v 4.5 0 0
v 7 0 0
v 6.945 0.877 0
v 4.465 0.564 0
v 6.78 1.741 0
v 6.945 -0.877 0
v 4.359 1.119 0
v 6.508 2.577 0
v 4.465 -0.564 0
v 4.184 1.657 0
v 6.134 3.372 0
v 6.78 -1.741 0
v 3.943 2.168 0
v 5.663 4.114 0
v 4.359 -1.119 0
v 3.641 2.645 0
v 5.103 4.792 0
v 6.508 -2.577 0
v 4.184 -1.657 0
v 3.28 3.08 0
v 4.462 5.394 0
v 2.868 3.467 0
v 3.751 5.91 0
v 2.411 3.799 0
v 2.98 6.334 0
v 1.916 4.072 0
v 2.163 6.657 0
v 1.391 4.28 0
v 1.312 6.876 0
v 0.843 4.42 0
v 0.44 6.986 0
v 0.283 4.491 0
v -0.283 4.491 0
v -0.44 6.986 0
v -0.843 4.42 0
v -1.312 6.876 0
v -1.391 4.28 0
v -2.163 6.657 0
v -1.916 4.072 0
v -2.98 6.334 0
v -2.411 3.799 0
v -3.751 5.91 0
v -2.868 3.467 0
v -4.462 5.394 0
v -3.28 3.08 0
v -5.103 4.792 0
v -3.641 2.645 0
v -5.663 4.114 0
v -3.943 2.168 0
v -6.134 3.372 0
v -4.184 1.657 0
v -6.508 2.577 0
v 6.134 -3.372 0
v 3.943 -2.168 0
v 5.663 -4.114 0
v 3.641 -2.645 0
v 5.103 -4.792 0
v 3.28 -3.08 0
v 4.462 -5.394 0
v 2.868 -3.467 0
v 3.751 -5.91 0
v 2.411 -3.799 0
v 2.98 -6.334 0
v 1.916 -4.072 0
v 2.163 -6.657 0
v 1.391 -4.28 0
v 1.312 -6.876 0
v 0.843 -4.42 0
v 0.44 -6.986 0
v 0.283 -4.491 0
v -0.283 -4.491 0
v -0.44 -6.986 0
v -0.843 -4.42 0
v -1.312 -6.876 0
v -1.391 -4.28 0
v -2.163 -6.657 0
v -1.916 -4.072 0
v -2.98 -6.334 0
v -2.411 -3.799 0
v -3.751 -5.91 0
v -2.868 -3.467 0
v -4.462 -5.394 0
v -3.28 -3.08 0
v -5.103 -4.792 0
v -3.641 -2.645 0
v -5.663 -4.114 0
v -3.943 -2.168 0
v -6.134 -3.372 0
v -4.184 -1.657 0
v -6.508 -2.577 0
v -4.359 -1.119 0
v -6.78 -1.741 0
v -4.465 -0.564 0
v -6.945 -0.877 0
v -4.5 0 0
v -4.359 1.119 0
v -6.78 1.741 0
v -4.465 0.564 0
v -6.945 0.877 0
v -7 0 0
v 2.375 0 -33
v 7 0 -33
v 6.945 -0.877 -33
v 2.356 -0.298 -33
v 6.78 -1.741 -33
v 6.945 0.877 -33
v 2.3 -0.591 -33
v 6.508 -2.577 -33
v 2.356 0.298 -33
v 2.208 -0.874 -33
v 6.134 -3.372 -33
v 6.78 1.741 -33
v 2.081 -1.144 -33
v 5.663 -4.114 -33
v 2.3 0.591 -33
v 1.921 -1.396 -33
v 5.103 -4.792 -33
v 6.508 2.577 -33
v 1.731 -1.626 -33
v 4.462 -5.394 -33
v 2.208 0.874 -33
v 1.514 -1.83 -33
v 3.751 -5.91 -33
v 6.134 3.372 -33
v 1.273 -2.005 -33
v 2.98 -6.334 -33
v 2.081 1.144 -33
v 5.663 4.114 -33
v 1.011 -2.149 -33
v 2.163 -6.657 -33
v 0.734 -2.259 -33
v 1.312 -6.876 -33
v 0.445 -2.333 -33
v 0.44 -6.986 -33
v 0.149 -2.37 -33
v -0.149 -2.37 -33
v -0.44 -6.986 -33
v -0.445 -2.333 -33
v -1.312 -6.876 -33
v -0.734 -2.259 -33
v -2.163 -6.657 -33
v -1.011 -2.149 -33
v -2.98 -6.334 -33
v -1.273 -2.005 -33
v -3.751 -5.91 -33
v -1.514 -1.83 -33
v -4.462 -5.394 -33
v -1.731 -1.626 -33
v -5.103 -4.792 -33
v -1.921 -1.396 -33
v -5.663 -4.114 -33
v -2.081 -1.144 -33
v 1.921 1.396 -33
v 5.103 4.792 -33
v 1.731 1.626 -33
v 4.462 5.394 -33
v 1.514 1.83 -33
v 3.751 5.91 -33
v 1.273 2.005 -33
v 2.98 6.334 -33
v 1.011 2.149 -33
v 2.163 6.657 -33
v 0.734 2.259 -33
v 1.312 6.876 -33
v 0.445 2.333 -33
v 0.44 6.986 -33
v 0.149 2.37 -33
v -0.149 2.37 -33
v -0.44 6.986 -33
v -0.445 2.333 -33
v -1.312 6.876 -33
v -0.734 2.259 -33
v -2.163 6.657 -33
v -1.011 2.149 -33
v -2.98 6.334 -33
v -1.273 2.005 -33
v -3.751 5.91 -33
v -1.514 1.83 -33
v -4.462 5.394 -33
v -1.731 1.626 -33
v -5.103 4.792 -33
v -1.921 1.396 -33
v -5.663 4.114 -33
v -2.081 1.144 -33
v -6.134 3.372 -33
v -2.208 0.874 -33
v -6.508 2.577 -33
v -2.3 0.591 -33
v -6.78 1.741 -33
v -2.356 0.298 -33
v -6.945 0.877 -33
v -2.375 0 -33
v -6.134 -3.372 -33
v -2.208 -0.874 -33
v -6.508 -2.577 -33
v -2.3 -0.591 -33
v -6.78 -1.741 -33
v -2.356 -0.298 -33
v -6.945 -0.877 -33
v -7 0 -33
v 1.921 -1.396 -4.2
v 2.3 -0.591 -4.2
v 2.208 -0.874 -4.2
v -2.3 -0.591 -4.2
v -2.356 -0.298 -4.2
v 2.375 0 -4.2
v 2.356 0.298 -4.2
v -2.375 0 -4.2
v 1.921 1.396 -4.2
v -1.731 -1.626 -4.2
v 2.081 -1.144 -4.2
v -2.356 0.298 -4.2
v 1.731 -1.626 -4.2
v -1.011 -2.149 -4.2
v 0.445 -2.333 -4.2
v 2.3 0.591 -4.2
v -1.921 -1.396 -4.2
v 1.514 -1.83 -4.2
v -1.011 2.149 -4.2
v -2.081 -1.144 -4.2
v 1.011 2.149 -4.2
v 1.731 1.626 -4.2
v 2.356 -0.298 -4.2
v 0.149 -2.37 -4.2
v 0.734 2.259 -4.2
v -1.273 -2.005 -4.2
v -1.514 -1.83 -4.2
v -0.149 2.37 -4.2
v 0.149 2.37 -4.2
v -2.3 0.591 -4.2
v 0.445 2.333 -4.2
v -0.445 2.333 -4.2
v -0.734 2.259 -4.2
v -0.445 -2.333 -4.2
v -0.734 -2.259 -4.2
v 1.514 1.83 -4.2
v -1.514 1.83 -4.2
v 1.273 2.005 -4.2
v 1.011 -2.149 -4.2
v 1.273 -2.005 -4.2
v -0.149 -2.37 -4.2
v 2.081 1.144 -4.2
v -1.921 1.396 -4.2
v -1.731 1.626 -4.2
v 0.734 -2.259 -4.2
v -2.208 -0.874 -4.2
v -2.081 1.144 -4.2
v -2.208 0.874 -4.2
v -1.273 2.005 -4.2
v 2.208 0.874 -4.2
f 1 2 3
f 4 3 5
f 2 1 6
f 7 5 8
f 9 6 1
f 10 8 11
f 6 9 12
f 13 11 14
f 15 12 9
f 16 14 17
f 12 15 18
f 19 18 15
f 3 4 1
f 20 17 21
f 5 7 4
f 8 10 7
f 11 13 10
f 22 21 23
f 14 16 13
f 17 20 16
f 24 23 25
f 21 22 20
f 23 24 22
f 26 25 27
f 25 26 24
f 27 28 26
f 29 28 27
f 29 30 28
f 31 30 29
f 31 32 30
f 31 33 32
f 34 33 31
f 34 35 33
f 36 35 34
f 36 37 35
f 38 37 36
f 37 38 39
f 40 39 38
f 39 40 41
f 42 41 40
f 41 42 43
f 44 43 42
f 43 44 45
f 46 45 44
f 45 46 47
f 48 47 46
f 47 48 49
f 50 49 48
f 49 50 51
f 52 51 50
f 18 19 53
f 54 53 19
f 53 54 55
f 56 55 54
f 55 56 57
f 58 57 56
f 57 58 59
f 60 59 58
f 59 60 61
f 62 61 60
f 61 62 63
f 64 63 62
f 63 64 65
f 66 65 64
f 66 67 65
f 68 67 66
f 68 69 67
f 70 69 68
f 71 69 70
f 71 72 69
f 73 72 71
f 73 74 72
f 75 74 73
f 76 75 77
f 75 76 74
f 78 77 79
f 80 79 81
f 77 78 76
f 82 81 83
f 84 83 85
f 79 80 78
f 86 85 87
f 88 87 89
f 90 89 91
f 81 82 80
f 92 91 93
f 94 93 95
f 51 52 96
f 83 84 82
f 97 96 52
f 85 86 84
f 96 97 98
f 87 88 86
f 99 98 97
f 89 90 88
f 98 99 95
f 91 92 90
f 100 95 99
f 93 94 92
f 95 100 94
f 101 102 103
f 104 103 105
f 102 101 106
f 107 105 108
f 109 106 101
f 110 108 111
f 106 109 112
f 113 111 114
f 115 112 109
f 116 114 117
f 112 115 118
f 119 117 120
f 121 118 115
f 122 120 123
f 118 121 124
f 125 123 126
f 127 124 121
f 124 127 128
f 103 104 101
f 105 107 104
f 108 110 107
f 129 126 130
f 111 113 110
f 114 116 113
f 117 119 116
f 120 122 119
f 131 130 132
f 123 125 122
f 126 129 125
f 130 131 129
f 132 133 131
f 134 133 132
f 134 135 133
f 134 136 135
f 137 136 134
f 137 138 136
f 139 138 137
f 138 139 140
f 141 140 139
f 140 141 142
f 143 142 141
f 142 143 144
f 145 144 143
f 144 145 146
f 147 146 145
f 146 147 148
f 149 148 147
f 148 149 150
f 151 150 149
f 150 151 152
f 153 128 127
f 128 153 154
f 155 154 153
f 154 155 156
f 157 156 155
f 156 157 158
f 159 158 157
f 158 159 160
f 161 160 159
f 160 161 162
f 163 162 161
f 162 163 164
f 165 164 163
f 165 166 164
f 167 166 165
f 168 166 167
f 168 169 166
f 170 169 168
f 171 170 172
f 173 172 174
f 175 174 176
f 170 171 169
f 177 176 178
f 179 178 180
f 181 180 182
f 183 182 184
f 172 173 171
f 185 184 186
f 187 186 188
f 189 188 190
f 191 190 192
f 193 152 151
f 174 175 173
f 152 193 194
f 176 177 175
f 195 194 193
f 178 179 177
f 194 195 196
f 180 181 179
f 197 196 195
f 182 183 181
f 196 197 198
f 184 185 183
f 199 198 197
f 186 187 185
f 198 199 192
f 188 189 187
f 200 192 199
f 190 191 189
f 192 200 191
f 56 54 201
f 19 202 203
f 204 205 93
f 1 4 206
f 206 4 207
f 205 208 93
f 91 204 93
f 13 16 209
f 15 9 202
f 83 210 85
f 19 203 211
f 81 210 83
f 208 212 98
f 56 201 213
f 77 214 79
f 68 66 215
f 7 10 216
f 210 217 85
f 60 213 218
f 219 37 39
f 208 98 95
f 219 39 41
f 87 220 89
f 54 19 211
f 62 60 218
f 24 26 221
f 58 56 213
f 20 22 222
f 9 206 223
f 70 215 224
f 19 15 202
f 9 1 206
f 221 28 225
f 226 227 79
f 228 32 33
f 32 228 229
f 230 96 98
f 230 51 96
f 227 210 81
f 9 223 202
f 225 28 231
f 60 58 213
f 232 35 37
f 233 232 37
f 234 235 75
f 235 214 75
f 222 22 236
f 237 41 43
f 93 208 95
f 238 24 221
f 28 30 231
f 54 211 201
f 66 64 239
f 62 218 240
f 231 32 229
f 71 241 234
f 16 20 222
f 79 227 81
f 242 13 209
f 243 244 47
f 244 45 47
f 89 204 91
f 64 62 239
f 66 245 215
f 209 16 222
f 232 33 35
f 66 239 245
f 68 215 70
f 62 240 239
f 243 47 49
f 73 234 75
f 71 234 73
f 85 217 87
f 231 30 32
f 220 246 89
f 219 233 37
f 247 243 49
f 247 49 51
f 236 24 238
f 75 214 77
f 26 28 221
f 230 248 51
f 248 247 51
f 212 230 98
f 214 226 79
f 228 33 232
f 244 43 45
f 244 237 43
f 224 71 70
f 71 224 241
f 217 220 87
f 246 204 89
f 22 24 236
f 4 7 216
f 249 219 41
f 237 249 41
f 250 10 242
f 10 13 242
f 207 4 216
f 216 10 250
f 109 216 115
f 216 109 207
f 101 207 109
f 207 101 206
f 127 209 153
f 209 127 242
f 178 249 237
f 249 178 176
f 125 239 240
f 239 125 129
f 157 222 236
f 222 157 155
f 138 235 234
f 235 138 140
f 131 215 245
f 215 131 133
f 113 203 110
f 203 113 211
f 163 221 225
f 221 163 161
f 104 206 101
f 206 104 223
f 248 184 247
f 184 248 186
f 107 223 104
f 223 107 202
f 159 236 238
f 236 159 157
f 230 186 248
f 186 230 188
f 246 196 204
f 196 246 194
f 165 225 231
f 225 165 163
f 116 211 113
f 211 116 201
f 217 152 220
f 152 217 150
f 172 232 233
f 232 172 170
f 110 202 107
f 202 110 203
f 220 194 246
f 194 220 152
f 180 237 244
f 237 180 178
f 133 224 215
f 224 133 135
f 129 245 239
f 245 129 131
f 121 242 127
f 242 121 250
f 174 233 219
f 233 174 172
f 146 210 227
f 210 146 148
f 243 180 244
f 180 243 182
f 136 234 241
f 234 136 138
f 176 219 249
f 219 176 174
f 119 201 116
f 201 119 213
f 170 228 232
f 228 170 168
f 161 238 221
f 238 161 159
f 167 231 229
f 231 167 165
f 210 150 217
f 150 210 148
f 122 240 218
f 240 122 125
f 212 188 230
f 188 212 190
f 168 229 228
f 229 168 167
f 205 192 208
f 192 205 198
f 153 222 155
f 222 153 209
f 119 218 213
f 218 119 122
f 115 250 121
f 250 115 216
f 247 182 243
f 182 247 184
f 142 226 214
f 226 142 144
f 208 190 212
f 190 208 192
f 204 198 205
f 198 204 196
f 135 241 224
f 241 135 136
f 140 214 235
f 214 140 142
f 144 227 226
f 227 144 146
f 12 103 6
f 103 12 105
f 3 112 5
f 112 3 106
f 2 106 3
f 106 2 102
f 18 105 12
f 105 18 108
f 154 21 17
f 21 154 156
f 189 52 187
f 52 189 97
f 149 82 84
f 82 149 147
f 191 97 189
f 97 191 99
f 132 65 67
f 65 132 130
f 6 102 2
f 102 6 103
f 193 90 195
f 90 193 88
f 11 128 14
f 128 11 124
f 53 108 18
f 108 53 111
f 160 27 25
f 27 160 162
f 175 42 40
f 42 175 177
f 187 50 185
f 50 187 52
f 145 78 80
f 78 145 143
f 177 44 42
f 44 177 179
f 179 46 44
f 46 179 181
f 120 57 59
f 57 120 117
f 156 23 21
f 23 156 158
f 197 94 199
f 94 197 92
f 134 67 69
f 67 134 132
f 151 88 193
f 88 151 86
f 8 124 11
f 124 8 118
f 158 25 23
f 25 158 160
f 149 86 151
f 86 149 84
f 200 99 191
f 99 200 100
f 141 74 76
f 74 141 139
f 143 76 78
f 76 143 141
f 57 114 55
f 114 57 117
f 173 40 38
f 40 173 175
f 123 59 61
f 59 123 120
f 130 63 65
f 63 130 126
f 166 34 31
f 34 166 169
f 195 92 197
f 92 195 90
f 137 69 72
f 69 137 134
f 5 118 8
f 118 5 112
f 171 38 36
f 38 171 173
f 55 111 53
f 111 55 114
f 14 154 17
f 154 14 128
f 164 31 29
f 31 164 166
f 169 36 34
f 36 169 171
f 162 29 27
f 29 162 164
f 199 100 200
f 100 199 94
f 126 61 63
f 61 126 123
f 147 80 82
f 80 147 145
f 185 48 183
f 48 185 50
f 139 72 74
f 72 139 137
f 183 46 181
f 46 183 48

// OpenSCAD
$fn = 50;


difference() {
	union() {
		translate(v = [0, 0, -33.0000000000]) {
			cylinder(h = 33, r = 7.0000000000);
		}
		cylinder(h = 0, r = 16.0000000000);
	}
	union() {
		translate(v = [0, 0, 0]) {
			rotate(a = [0, 0, 0]) {
				difference() {
					union() {
						#translate(v = [0, 0, -33.0000000000]) {
							cylinder(h = 33, r = 2.2500000000);
						}
						#translate(v = [0, 0, -4.2000000000]) {
							cylinder(h = 4.2000000000, r1 = 2.3750000000, r2 = 4.5000000000);
						}
						#translate(v = [0, 0, -33.0000000000]) {
							cylinder(h = 33, r = 2.3750000000);
						}
						#translate(v = [0, 0, -33.0000000000]) {
							cylinder(h = 33, r = 2.2500000000);
						}
					}
					union();
				}
			}
		}
	}
}
